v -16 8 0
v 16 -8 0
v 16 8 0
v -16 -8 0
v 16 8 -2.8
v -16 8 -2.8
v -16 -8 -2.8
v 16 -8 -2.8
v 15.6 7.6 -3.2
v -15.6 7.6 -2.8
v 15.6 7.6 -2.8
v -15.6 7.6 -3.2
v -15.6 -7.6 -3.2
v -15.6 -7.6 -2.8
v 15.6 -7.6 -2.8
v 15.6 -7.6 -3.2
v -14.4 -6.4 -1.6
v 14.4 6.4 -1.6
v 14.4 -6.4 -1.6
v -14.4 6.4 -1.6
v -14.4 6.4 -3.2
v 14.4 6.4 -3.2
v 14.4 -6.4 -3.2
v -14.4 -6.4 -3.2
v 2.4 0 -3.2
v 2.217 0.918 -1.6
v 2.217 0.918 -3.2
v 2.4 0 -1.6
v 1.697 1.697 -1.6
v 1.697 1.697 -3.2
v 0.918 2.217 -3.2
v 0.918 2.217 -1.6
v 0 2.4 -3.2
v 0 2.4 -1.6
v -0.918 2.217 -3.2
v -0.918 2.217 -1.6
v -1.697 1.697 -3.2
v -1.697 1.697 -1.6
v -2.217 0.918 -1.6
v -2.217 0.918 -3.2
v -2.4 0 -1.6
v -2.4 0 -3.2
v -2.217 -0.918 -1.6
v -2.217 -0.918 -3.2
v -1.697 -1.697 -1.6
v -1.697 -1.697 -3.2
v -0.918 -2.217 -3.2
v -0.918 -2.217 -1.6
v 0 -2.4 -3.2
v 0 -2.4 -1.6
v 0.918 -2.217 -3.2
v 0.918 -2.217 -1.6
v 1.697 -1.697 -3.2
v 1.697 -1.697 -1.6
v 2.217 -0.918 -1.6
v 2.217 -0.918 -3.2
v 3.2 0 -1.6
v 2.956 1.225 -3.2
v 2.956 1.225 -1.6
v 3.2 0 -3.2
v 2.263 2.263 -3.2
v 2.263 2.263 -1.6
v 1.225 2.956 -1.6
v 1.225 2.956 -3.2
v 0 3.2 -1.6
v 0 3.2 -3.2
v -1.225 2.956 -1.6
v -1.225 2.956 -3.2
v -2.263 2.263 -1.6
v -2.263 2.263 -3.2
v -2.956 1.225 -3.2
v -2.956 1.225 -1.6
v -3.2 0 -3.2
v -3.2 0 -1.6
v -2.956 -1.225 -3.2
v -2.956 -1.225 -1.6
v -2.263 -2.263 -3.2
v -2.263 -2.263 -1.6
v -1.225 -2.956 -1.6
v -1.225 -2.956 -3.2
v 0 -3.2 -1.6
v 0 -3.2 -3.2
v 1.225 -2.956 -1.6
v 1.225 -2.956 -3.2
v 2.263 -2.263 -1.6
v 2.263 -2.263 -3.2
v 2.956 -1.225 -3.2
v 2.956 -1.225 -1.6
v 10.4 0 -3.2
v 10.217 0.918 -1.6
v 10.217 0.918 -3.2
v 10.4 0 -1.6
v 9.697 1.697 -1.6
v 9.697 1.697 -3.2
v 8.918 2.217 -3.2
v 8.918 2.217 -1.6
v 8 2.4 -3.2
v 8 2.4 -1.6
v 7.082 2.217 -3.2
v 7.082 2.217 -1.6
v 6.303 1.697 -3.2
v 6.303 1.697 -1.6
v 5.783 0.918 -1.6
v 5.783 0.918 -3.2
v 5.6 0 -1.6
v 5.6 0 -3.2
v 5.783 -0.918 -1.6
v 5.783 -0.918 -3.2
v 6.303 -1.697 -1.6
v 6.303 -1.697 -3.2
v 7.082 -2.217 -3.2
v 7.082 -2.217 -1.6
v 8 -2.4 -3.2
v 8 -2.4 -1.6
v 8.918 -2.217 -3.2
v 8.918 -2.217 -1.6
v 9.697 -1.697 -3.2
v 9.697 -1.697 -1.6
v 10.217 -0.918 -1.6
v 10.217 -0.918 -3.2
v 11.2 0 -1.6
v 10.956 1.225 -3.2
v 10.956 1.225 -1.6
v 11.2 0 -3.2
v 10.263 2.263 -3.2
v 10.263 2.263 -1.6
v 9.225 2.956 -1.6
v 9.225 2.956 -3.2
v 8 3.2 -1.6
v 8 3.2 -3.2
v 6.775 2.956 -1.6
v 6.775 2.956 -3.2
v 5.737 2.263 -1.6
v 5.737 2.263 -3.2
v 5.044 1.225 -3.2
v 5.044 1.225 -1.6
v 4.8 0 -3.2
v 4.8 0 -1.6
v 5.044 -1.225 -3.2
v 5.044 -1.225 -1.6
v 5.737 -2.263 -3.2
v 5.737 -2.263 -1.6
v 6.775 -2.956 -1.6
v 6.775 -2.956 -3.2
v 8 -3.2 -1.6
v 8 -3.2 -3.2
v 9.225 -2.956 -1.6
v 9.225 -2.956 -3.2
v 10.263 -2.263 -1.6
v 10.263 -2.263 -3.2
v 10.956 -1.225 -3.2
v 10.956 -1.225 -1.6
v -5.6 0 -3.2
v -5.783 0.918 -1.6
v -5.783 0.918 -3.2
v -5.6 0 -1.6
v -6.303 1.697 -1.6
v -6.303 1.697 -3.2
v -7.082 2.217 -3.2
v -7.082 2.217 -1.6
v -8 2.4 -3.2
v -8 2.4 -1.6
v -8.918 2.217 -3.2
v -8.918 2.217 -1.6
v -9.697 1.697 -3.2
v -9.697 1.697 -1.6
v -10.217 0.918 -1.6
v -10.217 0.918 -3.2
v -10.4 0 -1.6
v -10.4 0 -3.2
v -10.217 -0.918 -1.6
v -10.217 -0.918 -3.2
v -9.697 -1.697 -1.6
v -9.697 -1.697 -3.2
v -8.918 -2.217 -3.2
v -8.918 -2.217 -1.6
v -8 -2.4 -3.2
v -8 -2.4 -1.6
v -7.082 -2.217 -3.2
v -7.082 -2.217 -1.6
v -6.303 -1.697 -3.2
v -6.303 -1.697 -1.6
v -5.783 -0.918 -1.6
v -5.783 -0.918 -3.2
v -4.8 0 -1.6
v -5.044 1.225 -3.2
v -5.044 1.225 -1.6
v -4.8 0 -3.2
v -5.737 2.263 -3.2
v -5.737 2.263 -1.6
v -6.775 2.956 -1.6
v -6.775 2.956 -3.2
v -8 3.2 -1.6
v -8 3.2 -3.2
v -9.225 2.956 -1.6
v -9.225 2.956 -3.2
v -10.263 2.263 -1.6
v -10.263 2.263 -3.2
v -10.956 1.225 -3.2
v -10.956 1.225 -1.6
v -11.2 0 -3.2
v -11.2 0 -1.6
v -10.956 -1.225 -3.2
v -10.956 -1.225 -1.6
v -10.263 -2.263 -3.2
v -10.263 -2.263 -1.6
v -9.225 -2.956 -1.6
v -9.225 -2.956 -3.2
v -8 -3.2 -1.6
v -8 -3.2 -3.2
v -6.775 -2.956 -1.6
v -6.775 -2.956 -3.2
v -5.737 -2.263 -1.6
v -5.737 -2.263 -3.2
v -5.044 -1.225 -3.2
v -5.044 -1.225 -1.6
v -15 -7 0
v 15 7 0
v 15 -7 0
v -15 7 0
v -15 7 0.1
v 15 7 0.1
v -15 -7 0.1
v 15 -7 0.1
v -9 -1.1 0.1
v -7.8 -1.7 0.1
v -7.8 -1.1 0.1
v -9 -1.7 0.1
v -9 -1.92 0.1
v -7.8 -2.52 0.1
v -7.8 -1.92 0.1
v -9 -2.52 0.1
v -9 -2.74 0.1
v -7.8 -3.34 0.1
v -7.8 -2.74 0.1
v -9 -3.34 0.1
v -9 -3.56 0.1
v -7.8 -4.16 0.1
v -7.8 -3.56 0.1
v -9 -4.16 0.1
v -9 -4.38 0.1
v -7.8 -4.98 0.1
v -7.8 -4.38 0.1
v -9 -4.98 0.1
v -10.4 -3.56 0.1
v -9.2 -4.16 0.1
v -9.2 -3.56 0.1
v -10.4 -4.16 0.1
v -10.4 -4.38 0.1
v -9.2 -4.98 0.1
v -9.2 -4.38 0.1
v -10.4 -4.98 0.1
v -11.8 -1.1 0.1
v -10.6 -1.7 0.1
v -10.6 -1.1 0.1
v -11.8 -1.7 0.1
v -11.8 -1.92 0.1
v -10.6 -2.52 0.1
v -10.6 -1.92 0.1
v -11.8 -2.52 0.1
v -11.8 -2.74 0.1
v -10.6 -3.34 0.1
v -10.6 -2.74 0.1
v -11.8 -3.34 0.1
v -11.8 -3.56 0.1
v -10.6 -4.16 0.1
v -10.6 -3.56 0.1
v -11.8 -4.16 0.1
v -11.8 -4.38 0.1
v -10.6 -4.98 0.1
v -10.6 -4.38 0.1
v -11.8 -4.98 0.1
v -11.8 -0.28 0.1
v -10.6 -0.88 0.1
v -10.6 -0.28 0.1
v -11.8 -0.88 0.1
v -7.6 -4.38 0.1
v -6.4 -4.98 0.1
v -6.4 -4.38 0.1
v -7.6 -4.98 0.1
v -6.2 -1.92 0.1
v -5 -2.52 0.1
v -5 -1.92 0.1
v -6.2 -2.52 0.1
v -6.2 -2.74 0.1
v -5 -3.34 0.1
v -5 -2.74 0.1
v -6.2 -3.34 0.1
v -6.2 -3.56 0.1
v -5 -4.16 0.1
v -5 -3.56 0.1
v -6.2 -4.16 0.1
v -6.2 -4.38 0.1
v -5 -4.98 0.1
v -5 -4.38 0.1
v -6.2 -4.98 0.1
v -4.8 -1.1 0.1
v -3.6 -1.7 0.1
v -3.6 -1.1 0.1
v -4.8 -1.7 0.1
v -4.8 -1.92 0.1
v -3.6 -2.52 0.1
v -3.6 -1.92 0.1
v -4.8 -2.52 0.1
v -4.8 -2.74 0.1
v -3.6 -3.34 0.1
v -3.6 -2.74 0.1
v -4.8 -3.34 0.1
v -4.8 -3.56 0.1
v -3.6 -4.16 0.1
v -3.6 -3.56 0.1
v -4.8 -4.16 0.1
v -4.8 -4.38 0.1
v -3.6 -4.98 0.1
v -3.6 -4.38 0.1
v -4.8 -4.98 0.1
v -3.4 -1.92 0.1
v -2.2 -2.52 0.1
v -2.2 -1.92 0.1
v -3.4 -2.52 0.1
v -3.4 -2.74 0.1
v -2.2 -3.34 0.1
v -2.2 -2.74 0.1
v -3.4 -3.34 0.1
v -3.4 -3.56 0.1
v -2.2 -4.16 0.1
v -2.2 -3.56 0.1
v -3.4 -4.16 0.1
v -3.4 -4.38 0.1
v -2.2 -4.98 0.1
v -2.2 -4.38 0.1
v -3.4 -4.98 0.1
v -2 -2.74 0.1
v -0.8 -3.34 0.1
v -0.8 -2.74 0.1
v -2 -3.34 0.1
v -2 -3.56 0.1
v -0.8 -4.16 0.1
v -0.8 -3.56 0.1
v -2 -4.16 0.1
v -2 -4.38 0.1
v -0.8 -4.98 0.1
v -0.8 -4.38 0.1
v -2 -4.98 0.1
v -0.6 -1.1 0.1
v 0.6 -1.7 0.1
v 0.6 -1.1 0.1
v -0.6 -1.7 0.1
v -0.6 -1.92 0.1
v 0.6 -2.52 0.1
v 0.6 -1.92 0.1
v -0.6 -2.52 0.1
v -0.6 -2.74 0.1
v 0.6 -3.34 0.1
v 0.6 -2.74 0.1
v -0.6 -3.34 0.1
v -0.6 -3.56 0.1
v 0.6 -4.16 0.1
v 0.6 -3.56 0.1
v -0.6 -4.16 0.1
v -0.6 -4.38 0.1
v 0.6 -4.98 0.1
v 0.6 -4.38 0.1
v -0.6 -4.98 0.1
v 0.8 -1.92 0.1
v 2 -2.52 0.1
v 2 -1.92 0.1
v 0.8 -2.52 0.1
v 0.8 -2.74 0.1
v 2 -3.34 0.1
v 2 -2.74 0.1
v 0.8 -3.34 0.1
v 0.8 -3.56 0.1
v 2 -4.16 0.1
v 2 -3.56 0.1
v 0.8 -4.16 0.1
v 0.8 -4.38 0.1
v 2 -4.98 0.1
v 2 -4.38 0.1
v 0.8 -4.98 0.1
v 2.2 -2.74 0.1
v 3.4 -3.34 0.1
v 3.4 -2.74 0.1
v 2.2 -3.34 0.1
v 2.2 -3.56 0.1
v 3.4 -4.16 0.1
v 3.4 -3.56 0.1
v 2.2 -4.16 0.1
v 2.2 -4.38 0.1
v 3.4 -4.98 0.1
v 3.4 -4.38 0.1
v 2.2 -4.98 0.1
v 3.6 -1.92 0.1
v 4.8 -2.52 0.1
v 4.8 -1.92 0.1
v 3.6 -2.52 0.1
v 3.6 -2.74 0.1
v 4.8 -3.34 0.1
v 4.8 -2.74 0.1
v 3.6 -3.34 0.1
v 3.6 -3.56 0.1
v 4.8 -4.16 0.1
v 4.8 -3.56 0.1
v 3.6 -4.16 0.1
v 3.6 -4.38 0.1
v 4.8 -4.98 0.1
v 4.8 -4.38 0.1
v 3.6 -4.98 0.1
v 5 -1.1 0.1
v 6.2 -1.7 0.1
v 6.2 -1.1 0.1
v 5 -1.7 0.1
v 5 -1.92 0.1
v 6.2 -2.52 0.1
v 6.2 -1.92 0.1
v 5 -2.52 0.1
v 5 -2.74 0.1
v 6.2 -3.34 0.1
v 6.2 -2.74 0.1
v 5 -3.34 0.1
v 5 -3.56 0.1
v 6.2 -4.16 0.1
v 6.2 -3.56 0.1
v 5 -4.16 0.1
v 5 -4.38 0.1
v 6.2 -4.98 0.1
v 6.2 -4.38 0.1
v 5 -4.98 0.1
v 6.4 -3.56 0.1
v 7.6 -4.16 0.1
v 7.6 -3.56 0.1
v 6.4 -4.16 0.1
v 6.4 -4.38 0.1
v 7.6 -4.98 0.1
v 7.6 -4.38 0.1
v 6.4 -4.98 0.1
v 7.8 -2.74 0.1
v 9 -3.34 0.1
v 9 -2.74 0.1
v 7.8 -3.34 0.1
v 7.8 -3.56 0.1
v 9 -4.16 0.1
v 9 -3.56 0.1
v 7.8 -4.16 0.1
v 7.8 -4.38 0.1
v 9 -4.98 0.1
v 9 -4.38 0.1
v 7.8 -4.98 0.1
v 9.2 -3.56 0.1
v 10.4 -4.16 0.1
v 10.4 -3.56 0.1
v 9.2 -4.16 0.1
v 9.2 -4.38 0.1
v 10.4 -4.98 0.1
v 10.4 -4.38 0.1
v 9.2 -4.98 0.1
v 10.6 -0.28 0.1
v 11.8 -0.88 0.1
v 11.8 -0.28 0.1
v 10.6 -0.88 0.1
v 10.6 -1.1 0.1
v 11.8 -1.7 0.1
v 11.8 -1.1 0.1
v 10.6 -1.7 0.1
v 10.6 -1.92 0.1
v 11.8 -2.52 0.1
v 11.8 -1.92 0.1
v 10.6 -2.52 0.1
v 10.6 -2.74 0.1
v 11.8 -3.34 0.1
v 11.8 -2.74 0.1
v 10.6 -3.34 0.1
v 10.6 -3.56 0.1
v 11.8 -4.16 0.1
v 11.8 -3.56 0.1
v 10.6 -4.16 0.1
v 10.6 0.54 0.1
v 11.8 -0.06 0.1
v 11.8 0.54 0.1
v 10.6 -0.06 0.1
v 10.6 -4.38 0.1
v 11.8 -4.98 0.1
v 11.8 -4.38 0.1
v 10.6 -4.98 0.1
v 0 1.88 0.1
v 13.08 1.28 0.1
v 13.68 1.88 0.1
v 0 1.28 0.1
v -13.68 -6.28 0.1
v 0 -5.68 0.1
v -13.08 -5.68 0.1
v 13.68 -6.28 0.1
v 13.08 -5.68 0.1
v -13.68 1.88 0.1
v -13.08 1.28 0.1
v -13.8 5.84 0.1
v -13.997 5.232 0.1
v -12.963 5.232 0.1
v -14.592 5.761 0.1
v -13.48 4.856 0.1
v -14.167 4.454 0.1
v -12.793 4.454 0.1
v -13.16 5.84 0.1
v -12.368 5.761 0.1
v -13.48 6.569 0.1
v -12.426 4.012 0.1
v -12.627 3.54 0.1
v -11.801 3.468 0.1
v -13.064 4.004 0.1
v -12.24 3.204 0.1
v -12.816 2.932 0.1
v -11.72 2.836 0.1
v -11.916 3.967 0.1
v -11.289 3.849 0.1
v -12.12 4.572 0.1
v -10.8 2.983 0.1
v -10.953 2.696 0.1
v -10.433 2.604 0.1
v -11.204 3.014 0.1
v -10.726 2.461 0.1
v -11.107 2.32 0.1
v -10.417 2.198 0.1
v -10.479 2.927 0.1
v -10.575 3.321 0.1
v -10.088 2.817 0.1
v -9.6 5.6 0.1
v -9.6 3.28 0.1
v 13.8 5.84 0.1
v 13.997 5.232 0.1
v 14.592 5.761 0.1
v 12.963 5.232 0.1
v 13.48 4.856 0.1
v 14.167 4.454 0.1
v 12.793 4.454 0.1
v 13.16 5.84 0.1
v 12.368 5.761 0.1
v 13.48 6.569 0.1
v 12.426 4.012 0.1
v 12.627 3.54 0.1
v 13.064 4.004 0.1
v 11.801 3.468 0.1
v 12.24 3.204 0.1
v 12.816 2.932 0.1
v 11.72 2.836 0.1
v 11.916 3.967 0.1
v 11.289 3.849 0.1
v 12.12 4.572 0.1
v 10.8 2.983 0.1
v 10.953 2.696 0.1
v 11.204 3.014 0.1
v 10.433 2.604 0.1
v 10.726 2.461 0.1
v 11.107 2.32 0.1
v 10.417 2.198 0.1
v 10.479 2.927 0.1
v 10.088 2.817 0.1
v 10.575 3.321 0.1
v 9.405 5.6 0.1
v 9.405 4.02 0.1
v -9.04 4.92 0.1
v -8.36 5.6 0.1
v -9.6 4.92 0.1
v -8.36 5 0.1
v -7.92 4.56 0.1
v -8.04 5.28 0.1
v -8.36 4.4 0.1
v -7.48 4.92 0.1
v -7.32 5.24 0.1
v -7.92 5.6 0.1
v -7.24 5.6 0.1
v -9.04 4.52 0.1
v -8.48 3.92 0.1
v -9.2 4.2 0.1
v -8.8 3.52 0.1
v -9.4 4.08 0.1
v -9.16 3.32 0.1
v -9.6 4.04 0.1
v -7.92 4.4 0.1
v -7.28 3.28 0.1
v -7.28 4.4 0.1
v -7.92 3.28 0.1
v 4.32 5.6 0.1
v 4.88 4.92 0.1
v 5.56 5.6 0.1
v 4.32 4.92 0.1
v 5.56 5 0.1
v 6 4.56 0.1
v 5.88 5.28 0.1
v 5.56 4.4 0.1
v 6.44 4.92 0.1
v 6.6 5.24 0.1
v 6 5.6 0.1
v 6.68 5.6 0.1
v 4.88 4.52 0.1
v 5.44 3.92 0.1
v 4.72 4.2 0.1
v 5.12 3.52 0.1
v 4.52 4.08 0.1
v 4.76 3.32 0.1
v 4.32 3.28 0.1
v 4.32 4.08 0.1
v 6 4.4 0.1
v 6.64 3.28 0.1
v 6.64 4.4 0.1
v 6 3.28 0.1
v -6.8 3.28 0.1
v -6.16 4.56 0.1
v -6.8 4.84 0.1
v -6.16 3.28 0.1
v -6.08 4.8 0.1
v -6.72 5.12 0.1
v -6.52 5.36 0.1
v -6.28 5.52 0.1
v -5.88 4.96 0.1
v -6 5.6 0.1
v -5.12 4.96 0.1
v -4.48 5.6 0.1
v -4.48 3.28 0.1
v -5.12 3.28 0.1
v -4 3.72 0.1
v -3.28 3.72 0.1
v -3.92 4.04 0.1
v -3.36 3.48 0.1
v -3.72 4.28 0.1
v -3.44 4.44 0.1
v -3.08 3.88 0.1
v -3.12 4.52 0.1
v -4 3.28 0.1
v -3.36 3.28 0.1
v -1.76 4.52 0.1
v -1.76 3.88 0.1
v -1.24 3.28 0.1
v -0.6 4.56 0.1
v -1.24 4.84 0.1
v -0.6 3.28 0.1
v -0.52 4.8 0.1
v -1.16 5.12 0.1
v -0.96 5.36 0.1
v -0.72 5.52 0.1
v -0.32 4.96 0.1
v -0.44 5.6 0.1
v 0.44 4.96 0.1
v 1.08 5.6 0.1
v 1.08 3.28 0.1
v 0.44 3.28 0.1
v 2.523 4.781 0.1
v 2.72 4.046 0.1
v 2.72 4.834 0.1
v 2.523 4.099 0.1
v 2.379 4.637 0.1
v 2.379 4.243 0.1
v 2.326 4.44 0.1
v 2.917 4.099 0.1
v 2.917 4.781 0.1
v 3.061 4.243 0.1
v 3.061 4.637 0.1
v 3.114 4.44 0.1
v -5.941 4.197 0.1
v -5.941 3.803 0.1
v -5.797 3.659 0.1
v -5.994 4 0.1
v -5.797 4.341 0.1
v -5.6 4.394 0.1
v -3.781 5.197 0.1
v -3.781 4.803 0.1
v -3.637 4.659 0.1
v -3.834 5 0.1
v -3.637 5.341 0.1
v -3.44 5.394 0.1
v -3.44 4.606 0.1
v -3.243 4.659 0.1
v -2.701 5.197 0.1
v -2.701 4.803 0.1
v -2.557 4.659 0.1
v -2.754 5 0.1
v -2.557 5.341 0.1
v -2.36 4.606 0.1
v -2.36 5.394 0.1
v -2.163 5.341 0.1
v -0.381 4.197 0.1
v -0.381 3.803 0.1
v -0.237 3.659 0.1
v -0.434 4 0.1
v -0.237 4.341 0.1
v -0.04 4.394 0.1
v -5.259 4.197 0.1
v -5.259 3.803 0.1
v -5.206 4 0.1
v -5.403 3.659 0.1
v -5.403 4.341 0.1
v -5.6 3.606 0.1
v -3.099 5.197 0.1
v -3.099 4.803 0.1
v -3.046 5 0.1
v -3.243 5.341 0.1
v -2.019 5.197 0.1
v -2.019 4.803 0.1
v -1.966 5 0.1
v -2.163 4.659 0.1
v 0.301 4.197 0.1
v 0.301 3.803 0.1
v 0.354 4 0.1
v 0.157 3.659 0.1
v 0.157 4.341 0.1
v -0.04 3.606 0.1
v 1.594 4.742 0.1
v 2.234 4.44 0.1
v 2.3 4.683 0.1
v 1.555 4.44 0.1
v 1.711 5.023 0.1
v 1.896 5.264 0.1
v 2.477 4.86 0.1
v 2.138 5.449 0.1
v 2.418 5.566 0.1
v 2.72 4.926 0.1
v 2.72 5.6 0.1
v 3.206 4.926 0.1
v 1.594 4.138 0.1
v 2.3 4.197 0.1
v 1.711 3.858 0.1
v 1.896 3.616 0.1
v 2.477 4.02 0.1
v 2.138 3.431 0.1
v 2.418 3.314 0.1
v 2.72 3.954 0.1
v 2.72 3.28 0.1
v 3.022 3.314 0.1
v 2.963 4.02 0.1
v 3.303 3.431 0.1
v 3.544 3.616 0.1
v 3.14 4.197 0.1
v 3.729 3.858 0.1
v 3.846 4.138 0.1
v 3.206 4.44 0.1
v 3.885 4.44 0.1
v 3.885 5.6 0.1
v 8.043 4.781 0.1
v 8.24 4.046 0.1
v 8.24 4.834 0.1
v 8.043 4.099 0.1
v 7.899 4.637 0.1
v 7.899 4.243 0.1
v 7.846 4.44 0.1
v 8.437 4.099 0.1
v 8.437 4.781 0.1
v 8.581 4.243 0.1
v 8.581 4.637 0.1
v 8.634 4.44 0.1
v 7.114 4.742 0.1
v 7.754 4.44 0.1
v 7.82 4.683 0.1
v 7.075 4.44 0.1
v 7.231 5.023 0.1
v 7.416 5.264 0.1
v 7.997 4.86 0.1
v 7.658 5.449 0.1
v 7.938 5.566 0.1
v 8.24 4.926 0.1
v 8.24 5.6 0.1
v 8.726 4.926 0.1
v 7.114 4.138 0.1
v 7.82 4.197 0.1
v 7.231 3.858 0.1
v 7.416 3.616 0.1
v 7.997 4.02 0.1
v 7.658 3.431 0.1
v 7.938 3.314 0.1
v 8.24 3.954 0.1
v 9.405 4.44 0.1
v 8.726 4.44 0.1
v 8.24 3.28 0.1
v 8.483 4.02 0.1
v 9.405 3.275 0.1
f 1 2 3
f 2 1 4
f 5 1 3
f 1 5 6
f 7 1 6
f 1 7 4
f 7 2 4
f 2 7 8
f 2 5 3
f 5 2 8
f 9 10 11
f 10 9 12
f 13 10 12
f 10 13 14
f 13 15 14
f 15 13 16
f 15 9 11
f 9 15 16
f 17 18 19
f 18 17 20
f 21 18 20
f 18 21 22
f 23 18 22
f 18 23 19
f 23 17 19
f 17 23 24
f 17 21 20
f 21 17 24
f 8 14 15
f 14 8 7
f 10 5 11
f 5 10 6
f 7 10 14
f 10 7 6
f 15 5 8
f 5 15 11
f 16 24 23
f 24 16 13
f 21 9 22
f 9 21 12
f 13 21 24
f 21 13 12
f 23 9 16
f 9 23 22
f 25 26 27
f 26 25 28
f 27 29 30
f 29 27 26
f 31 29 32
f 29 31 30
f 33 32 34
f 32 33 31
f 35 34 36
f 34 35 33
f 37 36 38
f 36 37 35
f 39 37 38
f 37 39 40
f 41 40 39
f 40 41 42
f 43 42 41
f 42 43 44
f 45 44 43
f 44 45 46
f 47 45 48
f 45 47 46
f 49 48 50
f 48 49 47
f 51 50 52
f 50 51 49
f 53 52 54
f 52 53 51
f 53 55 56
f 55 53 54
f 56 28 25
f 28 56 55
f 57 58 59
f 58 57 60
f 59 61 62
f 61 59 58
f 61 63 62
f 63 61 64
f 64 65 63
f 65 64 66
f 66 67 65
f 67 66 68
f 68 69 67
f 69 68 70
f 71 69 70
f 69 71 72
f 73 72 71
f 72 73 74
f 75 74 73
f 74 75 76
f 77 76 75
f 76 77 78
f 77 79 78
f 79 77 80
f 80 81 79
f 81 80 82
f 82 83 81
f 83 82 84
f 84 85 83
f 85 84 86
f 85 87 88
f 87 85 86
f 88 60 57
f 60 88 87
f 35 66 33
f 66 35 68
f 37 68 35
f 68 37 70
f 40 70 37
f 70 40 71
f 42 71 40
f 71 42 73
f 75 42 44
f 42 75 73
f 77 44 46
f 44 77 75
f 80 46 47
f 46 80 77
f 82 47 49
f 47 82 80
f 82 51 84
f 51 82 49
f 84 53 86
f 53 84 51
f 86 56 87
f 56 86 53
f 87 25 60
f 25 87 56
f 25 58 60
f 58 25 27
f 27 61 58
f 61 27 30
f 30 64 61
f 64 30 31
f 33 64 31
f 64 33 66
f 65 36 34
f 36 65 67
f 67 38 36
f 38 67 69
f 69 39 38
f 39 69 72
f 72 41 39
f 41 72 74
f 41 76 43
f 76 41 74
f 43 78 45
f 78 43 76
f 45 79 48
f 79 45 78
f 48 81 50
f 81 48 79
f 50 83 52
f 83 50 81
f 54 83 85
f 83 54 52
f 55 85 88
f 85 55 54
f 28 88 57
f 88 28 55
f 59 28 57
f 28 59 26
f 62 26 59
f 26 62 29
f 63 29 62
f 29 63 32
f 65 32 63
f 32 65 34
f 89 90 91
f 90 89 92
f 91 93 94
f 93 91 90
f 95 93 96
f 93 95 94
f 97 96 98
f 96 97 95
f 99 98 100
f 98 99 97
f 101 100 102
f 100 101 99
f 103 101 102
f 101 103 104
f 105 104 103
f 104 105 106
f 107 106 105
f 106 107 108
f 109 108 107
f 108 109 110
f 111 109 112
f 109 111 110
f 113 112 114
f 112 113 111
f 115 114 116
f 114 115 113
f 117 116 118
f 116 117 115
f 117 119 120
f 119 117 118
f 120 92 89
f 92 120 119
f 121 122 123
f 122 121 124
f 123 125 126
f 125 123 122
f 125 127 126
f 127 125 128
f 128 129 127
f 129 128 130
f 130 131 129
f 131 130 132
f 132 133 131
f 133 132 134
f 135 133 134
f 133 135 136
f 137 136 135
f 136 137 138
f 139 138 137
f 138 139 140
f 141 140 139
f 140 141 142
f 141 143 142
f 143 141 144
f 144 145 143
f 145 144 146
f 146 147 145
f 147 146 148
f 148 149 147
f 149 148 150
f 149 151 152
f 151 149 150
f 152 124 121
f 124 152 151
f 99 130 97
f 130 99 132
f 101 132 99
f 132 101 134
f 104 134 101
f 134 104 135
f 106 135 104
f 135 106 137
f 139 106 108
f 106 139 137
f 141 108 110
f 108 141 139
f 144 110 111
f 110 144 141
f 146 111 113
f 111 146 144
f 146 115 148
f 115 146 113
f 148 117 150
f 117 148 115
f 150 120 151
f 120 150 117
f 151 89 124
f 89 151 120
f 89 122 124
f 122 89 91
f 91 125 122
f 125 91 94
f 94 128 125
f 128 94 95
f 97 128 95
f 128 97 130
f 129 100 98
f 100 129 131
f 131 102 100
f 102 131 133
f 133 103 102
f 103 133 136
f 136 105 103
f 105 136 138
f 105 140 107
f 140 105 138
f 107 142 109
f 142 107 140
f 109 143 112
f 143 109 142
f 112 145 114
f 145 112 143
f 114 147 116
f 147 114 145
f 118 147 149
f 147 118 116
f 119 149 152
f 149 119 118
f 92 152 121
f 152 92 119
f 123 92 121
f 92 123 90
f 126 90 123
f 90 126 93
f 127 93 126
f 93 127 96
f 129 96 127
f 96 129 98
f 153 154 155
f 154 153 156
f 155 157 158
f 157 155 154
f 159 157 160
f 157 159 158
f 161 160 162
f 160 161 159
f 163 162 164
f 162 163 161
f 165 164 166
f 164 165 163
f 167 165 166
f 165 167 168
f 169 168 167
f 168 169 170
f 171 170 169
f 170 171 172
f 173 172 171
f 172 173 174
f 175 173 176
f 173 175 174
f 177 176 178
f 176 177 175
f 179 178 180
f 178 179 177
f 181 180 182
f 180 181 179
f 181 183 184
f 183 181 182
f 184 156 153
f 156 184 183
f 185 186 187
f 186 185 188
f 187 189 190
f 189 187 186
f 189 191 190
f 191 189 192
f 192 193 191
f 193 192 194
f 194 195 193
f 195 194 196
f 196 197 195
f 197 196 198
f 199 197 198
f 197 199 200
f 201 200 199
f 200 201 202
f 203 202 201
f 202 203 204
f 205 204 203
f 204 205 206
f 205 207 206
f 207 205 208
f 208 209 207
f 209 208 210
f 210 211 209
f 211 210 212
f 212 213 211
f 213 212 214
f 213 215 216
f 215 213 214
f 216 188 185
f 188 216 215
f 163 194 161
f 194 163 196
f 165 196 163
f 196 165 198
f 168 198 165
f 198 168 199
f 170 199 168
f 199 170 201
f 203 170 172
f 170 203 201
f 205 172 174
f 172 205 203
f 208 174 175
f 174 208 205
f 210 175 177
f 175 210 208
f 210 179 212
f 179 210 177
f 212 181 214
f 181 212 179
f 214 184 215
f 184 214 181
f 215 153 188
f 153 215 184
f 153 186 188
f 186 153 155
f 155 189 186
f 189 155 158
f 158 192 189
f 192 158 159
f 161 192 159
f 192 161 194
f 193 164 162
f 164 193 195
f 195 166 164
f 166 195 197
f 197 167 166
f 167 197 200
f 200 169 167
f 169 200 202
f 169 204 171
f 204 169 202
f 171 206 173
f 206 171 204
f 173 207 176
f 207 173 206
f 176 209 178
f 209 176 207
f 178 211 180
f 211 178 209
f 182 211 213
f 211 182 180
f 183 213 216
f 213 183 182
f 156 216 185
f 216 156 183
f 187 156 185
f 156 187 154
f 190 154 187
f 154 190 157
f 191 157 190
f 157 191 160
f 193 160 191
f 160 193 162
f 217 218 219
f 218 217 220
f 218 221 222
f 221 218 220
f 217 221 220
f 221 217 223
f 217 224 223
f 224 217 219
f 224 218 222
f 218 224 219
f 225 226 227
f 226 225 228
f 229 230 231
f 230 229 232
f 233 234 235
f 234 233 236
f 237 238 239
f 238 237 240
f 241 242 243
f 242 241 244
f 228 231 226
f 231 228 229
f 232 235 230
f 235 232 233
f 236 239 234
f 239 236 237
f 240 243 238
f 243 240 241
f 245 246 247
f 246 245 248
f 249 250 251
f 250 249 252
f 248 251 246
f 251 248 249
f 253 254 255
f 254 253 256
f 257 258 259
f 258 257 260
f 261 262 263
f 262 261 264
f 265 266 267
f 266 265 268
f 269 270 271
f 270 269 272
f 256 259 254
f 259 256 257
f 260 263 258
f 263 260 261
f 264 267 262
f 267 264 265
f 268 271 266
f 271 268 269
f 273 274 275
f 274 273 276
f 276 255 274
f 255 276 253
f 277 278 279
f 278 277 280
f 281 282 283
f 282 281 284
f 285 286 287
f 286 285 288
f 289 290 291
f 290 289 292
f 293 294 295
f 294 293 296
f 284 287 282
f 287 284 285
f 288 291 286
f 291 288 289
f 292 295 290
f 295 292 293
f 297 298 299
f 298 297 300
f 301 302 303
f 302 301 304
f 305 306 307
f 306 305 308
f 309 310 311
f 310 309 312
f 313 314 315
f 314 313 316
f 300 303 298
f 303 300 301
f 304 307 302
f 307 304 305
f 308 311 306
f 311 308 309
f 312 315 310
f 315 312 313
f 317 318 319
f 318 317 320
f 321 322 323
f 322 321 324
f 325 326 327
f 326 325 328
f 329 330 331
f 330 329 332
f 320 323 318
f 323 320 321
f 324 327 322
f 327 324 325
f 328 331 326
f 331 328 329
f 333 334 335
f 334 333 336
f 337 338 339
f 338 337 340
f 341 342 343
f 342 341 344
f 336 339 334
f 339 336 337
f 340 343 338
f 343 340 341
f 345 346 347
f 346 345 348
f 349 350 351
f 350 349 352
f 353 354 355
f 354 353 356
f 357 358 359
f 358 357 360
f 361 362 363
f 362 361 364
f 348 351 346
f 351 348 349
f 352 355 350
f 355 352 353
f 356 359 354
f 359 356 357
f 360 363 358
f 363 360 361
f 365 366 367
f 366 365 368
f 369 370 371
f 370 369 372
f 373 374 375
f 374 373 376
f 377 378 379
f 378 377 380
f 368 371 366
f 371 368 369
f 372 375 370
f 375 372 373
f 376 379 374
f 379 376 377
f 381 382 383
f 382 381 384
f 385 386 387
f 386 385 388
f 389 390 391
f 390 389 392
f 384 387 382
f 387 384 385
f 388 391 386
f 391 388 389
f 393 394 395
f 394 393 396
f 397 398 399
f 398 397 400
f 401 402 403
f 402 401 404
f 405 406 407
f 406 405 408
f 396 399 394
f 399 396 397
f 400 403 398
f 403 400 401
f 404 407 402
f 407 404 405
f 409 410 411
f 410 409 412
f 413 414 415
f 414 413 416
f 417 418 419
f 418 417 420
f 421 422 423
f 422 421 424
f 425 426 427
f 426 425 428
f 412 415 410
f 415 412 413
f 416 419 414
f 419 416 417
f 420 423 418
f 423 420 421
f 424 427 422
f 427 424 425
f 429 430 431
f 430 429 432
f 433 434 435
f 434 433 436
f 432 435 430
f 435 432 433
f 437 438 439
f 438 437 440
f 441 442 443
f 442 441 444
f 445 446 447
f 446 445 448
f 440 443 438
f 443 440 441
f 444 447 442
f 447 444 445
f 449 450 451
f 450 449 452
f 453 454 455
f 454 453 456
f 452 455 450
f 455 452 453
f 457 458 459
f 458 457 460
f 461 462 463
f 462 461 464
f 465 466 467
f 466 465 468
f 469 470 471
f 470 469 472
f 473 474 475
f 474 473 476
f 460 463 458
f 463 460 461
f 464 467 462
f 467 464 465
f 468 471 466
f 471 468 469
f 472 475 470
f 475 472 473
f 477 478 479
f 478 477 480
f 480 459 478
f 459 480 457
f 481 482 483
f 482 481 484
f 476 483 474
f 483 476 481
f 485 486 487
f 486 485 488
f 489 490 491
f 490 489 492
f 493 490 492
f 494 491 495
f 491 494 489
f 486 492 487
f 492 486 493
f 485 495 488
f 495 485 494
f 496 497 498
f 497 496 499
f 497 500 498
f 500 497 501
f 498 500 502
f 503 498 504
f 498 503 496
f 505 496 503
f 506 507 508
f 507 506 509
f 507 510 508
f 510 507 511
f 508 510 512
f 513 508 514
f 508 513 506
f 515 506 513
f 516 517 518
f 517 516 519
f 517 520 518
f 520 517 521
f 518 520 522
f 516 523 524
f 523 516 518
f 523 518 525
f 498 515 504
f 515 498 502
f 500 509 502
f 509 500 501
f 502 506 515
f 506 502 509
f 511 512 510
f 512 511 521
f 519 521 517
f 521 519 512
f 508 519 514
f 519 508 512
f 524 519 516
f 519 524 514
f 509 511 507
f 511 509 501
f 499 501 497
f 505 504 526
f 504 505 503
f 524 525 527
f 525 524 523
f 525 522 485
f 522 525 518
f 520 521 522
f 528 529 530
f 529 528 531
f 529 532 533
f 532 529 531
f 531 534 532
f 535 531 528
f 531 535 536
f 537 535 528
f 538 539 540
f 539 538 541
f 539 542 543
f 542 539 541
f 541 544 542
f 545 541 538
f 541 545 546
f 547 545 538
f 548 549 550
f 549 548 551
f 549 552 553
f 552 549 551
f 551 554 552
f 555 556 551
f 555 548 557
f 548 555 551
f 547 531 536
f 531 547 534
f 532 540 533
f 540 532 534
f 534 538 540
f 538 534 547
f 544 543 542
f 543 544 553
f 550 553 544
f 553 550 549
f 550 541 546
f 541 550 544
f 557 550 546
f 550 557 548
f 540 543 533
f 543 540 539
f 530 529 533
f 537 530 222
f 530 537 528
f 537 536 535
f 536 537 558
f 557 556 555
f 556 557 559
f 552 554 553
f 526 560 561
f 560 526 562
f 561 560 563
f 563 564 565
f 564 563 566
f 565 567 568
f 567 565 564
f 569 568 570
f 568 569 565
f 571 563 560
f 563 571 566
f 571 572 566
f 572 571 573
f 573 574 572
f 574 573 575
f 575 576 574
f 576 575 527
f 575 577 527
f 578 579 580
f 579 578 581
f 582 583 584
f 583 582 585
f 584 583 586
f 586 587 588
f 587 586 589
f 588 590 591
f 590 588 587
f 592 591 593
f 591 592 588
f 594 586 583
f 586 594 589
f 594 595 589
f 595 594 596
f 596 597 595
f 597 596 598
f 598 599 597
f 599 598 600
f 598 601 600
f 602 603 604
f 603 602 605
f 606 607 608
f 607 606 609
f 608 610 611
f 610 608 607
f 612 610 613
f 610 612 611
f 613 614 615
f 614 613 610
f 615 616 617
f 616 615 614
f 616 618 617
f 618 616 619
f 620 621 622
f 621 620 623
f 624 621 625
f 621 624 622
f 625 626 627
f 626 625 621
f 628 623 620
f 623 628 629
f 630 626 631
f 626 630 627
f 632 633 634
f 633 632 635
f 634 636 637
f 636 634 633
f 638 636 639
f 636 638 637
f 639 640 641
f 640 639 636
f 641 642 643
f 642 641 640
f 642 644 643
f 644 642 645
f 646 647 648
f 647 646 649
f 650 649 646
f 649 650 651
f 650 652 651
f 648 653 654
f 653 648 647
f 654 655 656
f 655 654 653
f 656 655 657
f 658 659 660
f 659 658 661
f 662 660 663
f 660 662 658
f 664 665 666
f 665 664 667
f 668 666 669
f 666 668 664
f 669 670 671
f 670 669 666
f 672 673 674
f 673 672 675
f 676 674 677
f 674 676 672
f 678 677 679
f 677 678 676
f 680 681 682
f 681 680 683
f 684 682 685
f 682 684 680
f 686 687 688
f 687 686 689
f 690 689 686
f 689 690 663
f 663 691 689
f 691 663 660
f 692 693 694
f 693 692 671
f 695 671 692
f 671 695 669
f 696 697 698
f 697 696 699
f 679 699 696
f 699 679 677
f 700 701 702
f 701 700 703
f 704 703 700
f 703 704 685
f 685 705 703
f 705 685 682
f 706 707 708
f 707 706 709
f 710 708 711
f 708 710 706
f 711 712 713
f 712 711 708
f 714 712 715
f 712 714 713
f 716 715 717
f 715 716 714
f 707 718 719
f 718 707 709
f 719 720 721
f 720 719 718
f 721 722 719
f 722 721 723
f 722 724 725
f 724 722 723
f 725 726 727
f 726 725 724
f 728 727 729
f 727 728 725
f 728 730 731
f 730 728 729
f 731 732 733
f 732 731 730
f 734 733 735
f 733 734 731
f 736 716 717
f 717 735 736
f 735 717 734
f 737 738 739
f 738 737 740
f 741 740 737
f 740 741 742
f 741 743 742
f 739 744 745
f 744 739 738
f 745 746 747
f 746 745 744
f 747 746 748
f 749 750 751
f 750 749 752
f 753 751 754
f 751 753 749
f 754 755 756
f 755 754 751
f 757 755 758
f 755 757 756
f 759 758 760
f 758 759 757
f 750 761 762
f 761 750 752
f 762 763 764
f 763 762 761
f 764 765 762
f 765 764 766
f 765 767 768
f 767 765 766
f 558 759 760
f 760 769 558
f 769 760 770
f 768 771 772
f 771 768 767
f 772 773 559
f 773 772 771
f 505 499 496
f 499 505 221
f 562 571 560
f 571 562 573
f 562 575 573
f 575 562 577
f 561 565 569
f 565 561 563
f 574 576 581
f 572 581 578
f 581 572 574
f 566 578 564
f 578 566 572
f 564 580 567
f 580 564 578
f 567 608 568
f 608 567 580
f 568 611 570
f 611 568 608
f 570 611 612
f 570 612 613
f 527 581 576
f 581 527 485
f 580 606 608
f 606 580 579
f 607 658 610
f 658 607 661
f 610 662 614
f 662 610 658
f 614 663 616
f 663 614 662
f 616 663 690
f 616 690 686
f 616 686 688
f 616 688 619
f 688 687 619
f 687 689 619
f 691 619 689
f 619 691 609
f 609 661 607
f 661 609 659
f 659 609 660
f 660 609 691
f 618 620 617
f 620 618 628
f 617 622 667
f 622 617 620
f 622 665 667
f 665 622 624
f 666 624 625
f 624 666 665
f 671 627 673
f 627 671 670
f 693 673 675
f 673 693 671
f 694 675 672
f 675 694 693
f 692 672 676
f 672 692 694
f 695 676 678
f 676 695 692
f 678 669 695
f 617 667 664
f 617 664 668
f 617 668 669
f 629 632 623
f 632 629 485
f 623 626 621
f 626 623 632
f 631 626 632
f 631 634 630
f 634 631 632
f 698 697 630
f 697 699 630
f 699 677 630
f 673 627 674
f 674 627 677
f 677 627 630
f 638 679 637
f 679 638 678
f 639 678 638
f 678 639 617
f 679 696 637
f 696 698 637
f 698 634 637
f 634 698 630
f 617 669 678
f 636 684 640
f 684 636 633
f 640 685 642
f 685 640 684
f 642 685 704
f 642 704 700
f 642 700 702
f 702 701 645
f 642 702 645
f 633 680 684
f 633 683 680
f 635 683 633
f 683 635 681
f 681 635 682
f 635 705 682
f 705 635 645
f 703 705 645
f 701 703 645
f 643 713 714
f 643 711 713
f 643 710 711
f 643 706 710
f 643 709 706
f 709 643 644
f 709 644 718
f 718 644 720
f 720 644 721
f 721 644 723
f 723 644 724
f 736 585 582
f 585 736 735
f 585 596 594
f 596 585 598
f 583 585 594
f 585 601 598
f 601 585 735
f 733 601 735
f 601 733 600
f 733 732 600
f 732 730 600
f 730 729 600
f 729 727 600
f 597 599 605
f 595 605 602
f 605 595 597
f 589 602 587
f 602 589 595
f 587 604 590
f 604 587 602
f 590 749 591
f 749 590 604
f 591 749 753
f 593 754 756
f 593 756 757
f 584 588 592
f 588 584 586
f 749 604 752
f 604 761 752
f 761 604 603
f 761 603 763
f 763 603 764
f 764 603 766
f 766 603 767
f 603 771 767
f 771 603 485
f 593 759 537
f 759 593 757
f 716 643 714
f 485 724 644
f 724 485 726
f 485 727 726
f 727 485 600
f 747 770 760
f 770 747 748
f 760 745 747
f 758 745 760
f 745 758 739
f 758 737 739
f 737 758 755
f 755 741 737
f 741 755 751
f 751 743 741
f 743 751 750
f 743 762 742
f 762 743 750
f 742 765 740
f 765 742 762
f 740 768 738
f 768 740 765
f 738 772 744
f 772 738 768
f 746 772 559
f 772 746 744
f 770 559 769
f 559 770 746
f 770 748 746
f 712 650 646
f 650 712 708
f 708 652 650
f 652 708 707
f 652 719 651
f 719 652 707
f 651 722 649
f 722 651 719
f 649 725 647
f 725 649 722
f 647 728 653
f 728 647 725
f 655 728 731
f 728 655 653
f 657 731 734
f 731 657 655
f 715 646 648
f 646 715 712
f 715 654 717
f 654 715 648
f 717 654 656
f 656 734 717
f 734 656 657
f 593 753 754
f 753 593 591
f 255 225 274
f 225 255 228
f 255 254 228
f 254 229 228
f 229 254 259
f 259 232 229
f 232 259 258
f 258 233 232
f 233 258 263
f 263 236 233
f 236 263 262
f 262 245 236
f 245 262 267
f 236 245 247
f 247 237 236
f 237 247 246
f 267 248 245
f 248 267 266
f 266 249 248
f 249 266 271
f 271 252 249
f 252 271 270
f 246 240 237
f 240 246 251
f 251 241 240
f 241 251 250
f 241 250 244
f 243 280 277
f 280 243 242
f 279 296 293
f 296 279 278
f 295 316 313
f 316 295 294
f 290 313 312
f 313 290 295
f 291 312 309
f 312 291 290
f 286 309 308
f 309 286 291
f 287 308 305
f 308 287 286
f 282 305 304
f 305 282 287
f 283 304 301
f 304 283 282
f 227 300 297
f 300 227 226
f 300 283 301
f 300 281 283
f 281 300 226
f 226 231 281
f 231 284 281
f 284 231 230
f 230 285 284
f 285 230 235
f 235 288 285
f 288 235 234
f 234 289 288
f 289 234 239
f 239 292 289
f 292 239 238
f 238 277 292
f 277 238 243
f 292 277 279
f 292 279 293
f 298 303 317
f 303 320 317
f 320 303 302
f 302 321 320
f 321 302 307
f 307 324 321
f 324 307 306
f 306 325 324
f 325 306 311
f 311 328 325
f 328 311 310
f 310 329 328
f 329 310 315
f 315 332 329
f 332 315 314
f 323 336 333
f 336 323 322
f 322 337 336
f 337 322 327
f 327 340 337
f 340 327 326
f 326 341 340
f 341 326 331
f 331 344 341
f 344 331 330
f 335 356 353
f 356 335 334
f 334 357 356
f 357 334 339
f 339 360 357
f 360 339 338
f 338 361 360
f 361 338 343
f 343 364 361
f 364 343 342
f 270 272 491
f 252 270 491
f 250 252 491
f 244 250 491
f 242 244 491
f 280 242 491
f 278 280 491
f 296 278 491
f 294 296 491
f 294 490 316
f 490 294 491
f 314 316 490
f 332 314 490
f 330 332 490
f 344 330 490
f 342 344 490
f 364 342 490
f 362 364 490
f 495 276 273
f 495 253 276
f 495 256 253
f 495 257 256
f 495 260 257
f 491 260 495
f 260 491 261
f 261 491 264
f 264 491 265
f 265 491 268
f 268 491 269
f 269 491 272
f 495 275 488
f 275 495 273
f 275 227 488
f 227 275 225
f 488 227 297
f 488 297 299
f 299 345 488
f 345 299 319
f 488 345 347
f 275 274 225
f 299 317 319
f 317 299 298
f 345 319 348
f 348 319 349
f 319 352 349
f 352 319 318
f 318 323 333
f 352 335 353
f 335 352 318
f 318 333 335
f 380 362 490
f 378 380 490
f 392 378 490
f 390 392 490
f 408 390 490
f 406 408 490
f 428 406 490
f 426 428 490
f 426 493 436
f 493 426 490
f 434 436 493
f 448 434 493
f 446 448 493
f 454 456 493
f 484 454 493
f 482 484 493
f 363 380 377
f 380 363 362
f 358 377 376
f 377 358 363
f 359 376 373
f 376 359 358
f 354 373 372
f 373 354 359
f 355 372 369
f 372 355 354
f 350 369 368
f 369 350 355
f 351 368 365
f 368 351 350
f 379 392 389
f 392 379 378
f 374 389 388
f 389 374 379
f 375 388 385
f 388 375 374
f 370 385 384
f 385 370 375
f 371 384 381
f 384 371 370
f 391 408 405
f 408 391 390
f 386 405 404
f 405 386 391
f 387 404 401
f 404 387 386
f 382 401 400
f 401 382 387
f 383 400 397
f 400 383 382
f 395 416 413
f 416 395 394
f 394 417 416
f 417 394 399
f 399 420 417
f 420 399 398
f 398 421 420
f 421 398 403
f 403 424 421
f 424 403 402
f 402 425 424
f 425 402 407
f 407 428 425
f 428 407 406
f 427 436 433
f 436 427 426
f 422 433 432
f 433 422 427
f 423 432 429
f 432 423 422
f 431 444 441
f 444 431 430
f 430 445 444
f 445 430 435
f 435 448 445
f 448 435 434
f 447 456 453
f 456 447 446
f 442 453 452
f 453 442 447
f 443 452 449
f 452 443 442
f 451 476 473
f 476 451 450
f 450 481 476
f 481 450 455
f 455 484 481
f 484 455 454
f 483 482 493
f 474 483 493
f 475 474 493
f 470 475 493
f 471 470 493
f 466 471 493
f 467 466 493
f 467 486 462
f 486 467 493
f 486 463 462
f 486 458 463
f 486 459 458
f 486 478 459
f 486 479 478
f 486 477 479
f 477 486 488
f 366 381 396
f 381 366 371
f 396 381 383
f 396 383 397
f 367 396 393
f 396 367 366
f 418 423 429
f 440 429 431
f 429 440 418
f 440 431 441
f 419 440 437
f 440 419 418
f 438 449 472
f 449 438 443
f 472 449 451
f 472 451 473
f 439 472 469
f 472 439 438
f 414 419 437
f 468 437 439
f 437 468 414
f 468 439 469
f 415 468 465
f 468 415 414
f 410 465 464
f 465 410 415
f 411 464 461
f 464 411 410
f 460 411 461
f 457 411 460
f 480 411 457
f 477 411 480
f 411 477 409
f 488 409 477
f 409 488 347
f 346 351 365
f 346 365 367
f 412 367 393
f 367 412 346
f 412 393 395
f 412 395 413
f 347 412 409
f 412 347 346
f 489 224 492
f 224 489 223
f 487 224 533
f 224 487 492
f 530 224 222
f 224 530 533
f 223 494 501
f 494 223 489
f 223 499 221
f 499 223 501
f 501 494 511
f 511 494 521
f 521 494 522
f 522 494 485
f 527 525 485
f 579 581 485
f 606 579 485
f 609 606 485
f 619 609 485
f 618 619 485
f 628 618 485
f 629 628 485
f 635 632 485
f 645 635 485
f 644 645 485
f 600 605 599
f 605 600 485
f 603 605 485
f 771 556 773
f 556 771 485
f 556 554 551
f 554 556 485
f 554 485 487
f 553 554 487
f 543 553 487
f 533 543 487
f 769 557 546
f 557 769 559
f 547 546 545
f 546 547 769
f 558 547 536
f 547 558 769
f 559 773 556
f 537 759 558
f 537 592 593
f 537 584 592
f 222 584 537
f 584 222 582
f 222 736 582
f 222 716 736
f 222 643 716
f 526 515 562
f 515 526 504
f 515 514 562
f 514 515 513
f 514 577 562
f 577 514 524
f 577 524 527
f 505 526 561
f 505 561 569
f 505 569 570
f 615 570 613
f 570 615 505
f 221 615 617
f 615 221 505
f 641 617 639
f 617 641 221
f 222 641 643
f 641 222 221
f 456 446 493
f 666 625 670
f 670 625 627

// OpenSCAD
use <../lib.scad>
use <6259759c.scad>
use <87079.scad>
function ldraw_lib__87079d0g() = [
// 0 Tile  2 x  4 with Magenta and White Striped Bars, Dark Turquoise Starts and Coral Alien "KARAOKE" Characters Sticker
// 0 Name: 87079d0g.dat
// 0 Author: Evert-Jan Boer [ejboer]
// 0 !LDRAW_ORG Shortcut UPDATE 2024-09
// 0 !LICENSE Licensed under CC BY 4.0 : see CAreadme.txt
// 
// 0 BFC CERTIFY CCW
  [0,"BFC","CERTIFY"],
  [0,"BFC","CCW"],
// 
// 0 !CATEGORY Sticker Shortcut
// 0 !KEYWORDS Bricklink 87079pb0697, Set 70828
// 
// 0 !HISTORY 2024-10-27 [OrionP] Official Update 2024-09
// 
// 1 16 0 0 0 1 0 0 0 1 0 0 0 1 87079.dat
  [1,16,0,0,0,1,0,0,0,1,0,0,0,1, ldraw_lib__87079()],
// 1 16 0 0 0 1 0 0 0 1 0 0 0 1 6259759c.dat
  [1,16,0,0,0,1,0,0,0,1,0,0,0,1, ldraw_lib__6259759c()],
];
module ldraw_lib__87079d0g(step=0, col=false, unit=2/5, alt=false, line=0.2, solid=!$preview)
    makepoly(ldraw_lib__87079d0g(), step=step, col=col, unit=unit, alt=alt, line=line, solid=solid);
ldraw_lib__87079d0g(line=0.2);
